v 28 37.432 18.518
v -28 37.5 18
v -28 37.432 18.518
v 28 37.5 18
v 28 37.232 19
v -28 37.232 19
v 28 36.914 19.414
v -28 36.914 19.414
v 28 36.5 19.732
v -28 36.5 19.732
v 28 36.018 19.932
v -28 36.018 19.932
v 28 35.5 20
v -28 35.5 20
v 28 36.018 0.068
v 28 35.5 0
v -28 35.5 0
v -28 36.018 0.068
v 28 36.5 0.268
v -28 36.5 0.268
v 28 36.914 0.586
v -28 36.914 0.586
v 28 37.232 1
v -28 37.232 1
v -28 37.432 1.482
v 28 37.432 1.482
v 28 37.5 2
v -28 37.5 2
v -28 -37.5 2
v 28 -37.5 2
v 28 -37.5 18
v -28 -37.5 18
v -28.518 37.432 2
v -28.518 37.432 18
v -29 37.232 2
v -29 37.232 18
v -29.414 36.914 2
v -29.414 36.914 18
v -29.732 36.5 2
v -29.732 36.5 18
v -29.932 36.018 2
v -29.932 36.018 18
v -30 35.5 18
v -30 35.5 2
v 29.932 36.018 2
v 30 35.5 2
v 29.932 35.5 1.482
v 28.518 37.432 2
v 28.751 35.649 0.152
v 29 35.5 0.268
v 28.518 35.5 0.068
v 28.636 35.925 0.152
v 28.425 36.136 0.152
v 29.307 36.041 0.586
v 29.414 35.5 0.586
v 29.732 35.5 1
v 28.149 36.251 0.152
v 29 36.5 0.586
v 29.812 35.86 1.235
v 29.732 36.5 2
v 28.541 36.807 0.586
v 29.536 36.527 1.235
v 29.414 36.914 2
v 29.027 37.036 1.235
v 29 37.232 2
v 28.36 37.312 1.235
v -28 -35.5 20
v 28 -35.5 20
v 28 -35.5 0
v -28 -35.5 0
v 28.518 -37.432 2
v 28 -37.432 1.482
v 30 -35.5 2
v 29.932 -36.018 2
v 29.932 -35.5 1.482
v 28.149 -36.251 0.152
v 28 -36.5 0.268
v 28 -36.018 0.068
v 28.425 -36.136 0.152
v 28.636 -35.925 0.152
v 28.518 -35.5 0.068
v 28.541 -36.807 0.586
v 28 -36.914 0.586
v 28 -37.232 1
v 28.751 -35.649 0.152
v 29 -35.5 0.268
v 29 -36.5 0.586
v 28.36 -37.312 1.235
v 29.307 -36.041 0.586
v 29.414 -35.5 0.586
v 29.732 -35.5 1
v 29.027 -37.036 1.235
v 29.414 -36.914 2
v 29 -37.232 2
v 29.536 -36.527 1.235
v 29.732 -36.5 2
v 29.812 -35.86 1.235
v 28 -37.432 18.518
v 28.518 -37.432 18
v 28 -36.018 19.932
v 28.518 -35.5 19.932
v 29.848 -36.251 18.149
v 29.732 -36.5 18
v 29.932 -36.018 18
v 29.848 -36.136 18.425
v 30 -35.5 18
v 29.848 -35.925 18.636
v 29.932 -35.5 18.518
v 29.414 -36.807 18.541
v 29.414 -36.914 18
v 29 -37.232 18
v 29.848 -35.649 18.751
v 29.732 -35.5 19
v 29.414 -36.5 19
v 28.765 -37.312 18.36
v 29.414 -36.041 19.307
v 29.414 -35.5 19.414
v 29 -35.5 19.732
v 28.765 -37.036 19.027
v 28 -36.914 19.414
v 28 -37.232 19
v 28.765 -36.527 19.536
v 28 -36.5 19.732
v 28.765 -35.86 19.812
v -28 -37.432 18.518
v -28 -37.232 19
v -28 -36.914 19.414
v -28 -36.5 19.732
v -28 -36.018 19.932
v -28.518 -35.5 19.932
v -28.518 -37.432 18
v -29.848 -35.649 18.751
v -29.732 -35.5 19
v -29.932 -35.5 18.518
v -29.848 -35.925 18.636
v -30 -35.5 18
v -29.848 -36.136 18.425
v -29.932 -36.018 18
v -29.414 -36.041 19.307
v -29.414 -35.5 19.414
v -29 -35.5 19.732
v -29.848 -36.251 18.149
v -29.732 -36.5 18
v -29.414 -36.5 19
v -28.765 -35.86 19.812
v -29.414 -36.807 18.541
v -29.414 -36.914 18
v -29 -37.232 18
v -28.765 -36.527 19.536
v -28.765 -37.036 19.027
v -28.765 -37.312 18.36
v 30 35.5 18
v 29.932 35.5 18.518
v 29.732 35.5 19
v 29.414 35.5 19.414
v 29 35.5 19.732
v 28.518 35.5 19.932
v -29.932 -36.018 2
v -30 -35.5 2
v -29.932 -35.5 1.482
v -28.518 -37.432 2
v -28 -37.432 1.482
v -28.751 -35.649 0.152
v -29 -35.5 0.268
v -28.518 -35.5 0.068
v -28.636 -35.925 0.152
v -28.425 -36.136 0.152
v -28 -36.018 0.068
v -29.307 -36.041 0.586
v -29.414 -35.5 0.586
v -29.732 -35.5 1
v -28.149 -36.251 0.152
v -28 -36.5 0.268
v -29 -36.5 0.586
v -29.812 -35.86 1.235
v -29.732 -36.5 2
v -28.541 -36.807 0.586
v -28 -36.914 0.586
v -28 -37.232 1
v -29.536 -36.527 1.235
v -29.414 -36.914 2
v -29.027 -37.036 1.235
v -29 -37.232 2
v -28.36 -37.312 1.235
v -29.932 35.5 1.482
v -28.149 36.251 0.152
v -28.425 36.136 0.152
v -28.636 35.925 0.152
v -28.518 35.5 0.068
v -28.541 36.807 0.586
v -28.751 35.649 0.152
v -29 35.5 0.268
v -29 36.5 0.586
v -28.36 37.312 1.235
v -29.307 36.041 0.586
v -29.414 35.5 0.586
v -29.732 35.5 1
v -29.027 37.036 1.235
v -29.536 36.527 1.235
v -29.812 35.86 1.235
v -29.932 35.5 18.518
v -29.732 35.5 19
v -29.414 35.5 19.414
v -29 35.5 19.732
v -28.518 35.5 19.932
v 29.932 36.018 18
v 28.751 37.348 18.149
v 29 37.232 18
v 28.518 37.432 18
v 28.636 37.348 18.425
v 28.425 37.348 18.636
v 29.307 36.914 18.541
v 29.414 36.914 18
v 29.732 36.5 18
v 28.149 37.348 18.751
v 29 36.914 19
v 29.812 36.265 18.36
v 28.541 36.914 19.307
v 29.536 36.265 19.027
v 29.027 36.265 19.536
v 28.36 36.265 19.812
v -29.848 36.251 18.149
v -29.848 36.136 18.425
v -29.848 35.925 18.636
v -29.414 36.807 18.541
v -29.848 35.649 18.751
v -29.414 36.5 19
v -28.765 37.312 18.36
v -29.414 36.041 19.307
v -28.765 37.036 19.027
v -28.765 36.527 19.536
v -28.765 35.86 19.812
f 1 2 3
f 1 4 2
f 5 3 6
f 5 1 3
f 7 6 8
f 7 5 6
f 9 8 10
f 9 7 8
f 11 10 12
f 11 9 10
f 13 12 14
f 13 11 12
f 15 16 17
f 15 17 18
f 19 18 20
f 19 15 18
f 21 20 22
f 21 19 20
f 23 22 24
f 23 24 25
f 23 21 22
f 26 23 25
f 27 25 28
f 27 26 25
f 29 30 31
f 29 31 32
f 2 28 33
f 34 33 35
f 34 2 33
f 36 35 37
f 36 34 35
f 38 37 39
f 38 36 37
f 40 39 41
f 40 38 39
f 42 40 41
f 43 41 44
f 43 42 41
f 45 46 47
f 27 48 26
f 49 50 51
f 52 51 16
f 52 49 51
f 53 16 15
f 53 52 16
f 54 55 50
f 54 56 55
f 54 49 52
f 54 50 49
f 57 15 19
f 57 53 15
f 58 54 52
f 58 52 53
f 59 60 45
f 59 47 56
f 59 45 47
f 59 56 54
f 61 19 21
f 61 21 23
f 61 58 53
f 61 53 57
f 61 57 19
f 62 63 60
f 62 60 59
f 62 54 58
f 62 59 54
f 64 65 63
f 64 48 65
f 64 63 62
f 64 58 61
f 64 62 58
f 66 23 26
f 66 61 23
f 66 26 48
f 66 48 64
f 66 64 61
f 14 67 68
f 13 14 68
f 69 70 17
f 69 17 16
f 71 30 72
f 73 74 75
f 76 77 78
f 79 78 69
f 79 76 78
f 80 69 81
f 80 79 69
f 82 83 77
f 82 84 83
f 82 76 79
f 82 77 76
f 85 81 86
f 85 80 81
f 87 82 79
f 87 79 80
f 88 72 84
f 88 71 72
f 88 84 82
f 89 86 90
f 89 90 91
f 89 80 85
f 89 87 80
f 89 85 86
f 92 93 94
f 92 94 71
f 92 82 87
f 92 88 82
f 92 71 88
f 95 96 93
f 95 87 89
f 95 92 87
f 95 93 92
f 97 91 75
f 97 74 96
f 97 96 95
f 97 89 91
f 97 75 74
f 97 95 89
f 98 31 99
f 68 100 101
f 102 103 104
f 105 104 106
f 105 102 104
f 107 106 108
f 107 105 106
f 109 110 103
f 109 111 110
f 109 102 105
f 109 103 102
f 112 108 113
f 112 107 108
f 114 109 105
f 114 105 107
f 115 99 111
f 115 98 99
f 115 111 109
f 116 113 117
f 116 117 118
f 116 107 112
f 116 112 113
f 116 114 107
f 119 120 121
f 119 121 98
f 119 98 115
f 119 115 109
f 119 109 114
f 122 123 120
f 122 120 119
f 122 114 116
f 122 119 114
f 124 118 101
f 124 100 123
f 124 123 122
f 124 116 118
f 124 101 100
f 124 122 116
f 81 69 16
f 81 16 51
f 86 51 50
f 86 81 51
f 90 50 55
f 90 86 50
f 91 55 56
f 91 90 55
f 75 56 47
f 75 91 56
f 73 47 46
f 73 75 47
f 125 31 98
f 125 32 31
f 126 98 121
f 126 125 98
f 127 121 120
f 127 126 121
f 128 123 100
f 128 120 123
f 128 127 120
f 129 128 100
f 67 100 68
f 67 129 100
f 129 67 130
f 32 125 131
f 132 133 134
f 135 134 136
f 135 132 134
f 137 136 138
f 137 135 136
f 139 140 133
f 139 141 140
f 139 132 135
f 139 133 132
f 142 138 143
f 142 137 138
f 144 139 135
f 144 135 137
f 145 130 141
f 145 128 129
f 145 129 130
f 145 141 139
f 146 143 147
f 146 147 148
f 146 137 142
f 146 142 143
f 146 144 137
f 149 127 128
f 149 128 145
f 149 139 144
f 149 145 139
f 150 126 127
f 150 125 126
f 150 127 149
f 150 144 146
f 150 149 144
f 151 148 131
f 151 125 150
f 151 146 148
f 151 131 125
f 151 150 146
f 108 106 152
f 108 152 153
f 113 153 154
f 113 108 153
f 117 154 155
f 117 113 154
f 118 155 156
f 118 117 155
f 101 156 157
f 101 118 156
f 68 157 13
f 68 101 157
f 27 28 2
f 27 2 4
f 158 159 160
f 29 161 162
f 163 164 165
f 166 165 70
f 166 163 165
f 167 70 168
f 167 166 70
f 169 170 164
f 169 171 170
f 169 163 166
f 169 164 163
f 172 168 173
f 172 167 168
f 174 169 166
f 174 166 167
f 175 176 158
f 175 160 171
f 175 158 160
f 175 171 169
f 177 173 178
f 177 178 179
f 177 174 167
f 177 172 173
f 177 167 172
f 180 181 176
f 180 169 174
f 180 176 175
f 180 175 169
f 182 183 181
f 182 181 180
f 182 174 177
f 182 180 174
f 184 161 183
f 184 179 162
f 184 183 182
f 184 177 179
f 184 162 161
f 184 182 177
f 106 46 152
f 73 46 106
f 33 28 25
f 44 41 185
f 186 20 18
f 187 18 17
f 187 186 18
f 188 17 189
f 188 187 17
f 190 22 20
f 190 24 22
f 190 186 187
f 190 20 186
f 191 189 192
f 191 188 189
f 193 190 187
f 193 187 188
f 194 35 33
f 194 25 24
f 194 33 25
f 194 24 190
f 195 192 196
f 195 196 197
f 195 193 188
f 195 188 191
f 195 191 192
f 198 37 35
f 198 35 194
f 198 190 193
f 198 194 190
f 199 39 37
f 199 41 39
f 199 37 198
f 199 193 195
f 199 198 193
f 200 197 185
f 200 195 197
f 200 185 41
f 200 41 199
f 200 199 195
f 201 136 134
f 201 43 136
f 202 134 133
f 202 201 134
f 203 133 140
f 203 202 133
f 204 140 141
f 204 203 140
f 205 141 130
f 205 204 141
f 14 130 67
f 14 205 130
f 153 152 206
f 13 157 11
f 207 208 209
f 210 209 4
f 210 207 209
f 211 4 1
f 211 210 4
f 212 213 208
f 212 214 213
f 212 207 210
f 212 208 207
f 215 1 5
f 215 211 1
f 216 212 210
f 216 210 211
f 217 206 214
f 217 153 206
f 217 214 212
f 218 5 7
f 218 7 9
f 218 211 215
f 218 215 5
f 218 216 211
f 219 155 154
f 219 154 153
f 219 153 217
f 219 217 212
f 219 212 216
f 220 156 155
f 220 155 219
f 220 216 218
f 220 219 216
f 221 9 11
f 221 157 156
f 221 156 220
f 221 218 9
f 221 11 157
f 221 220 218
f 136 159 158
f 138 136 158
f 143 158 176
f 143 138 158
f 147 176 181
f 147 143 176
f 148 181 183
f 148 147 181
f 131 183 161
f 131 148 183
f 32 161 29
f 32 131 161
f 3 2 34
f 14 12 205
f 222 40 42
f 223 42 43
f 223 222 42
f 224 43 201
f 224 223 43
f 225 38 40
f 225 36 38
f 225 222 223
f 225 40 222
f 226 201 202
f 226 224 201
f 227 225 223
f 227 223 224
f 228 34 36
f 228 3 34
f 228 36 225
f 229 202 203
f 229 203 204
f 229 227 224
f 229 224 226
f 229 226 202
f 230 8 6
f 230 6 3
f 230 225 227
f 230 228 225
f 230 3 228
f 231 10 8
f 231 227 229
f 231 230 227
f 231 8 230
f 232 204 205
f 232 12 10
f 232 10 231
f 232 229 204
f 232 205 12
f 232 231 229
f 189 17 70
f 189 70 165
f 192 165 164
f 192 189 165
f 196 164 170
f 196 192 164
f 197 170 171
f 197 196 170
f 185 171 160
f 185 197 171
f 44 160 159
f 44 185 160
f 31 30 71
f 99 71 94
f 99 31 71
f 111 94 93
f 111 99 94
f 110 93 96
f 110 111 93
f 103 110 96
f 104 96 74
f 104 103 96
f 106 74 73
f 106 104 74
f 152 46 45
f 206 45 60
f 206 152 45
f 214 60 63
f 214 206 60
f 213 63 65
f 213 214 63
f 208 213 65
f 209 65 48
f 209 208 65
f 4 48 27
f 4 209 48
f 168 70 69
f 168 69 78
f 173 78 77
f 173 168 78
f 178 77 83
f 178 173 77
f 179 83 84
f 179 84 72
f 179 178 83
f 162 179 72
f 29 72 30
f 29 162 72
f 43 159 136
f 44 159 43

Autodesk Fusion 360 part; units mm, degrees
sketch "Sketch1" plane through (0, 0, 0) normal (0, 0, 1) x (1, 0, 0)
  line L0 (-30, 37.5) -> (30, 37.5)
  line L1 (30, 37.5) -> (30, -37.5)
  line L2 (30, -37.5) -> (-30, -37.5)
  line L3 (-30, -37.5) -> (-30, 37.5)
  line L4 (-30, 37.5) -> (30, -37.5) construction
  line L5 (30, 37.5) -> (-30, -37.5) construction
  dimension "d1" = 60
  dimension "d2" = 75
extrude "Extrude1" add sketch "Sketch1" along normal blind 20
fillet "Fillet1" radius 2 12 edges at (0, -37.5, 20) (30, 0, 20) (0, 37.5, 20) (-30, 0, 20) (30, -37.5, 10) (-30, -37.5, 10) (30, 37.5, 10) (30, 0, 0) (0, -37.5, 0) (-30, 37.5, 10) (0, 37.5, 0) (-30, 0, 0)
